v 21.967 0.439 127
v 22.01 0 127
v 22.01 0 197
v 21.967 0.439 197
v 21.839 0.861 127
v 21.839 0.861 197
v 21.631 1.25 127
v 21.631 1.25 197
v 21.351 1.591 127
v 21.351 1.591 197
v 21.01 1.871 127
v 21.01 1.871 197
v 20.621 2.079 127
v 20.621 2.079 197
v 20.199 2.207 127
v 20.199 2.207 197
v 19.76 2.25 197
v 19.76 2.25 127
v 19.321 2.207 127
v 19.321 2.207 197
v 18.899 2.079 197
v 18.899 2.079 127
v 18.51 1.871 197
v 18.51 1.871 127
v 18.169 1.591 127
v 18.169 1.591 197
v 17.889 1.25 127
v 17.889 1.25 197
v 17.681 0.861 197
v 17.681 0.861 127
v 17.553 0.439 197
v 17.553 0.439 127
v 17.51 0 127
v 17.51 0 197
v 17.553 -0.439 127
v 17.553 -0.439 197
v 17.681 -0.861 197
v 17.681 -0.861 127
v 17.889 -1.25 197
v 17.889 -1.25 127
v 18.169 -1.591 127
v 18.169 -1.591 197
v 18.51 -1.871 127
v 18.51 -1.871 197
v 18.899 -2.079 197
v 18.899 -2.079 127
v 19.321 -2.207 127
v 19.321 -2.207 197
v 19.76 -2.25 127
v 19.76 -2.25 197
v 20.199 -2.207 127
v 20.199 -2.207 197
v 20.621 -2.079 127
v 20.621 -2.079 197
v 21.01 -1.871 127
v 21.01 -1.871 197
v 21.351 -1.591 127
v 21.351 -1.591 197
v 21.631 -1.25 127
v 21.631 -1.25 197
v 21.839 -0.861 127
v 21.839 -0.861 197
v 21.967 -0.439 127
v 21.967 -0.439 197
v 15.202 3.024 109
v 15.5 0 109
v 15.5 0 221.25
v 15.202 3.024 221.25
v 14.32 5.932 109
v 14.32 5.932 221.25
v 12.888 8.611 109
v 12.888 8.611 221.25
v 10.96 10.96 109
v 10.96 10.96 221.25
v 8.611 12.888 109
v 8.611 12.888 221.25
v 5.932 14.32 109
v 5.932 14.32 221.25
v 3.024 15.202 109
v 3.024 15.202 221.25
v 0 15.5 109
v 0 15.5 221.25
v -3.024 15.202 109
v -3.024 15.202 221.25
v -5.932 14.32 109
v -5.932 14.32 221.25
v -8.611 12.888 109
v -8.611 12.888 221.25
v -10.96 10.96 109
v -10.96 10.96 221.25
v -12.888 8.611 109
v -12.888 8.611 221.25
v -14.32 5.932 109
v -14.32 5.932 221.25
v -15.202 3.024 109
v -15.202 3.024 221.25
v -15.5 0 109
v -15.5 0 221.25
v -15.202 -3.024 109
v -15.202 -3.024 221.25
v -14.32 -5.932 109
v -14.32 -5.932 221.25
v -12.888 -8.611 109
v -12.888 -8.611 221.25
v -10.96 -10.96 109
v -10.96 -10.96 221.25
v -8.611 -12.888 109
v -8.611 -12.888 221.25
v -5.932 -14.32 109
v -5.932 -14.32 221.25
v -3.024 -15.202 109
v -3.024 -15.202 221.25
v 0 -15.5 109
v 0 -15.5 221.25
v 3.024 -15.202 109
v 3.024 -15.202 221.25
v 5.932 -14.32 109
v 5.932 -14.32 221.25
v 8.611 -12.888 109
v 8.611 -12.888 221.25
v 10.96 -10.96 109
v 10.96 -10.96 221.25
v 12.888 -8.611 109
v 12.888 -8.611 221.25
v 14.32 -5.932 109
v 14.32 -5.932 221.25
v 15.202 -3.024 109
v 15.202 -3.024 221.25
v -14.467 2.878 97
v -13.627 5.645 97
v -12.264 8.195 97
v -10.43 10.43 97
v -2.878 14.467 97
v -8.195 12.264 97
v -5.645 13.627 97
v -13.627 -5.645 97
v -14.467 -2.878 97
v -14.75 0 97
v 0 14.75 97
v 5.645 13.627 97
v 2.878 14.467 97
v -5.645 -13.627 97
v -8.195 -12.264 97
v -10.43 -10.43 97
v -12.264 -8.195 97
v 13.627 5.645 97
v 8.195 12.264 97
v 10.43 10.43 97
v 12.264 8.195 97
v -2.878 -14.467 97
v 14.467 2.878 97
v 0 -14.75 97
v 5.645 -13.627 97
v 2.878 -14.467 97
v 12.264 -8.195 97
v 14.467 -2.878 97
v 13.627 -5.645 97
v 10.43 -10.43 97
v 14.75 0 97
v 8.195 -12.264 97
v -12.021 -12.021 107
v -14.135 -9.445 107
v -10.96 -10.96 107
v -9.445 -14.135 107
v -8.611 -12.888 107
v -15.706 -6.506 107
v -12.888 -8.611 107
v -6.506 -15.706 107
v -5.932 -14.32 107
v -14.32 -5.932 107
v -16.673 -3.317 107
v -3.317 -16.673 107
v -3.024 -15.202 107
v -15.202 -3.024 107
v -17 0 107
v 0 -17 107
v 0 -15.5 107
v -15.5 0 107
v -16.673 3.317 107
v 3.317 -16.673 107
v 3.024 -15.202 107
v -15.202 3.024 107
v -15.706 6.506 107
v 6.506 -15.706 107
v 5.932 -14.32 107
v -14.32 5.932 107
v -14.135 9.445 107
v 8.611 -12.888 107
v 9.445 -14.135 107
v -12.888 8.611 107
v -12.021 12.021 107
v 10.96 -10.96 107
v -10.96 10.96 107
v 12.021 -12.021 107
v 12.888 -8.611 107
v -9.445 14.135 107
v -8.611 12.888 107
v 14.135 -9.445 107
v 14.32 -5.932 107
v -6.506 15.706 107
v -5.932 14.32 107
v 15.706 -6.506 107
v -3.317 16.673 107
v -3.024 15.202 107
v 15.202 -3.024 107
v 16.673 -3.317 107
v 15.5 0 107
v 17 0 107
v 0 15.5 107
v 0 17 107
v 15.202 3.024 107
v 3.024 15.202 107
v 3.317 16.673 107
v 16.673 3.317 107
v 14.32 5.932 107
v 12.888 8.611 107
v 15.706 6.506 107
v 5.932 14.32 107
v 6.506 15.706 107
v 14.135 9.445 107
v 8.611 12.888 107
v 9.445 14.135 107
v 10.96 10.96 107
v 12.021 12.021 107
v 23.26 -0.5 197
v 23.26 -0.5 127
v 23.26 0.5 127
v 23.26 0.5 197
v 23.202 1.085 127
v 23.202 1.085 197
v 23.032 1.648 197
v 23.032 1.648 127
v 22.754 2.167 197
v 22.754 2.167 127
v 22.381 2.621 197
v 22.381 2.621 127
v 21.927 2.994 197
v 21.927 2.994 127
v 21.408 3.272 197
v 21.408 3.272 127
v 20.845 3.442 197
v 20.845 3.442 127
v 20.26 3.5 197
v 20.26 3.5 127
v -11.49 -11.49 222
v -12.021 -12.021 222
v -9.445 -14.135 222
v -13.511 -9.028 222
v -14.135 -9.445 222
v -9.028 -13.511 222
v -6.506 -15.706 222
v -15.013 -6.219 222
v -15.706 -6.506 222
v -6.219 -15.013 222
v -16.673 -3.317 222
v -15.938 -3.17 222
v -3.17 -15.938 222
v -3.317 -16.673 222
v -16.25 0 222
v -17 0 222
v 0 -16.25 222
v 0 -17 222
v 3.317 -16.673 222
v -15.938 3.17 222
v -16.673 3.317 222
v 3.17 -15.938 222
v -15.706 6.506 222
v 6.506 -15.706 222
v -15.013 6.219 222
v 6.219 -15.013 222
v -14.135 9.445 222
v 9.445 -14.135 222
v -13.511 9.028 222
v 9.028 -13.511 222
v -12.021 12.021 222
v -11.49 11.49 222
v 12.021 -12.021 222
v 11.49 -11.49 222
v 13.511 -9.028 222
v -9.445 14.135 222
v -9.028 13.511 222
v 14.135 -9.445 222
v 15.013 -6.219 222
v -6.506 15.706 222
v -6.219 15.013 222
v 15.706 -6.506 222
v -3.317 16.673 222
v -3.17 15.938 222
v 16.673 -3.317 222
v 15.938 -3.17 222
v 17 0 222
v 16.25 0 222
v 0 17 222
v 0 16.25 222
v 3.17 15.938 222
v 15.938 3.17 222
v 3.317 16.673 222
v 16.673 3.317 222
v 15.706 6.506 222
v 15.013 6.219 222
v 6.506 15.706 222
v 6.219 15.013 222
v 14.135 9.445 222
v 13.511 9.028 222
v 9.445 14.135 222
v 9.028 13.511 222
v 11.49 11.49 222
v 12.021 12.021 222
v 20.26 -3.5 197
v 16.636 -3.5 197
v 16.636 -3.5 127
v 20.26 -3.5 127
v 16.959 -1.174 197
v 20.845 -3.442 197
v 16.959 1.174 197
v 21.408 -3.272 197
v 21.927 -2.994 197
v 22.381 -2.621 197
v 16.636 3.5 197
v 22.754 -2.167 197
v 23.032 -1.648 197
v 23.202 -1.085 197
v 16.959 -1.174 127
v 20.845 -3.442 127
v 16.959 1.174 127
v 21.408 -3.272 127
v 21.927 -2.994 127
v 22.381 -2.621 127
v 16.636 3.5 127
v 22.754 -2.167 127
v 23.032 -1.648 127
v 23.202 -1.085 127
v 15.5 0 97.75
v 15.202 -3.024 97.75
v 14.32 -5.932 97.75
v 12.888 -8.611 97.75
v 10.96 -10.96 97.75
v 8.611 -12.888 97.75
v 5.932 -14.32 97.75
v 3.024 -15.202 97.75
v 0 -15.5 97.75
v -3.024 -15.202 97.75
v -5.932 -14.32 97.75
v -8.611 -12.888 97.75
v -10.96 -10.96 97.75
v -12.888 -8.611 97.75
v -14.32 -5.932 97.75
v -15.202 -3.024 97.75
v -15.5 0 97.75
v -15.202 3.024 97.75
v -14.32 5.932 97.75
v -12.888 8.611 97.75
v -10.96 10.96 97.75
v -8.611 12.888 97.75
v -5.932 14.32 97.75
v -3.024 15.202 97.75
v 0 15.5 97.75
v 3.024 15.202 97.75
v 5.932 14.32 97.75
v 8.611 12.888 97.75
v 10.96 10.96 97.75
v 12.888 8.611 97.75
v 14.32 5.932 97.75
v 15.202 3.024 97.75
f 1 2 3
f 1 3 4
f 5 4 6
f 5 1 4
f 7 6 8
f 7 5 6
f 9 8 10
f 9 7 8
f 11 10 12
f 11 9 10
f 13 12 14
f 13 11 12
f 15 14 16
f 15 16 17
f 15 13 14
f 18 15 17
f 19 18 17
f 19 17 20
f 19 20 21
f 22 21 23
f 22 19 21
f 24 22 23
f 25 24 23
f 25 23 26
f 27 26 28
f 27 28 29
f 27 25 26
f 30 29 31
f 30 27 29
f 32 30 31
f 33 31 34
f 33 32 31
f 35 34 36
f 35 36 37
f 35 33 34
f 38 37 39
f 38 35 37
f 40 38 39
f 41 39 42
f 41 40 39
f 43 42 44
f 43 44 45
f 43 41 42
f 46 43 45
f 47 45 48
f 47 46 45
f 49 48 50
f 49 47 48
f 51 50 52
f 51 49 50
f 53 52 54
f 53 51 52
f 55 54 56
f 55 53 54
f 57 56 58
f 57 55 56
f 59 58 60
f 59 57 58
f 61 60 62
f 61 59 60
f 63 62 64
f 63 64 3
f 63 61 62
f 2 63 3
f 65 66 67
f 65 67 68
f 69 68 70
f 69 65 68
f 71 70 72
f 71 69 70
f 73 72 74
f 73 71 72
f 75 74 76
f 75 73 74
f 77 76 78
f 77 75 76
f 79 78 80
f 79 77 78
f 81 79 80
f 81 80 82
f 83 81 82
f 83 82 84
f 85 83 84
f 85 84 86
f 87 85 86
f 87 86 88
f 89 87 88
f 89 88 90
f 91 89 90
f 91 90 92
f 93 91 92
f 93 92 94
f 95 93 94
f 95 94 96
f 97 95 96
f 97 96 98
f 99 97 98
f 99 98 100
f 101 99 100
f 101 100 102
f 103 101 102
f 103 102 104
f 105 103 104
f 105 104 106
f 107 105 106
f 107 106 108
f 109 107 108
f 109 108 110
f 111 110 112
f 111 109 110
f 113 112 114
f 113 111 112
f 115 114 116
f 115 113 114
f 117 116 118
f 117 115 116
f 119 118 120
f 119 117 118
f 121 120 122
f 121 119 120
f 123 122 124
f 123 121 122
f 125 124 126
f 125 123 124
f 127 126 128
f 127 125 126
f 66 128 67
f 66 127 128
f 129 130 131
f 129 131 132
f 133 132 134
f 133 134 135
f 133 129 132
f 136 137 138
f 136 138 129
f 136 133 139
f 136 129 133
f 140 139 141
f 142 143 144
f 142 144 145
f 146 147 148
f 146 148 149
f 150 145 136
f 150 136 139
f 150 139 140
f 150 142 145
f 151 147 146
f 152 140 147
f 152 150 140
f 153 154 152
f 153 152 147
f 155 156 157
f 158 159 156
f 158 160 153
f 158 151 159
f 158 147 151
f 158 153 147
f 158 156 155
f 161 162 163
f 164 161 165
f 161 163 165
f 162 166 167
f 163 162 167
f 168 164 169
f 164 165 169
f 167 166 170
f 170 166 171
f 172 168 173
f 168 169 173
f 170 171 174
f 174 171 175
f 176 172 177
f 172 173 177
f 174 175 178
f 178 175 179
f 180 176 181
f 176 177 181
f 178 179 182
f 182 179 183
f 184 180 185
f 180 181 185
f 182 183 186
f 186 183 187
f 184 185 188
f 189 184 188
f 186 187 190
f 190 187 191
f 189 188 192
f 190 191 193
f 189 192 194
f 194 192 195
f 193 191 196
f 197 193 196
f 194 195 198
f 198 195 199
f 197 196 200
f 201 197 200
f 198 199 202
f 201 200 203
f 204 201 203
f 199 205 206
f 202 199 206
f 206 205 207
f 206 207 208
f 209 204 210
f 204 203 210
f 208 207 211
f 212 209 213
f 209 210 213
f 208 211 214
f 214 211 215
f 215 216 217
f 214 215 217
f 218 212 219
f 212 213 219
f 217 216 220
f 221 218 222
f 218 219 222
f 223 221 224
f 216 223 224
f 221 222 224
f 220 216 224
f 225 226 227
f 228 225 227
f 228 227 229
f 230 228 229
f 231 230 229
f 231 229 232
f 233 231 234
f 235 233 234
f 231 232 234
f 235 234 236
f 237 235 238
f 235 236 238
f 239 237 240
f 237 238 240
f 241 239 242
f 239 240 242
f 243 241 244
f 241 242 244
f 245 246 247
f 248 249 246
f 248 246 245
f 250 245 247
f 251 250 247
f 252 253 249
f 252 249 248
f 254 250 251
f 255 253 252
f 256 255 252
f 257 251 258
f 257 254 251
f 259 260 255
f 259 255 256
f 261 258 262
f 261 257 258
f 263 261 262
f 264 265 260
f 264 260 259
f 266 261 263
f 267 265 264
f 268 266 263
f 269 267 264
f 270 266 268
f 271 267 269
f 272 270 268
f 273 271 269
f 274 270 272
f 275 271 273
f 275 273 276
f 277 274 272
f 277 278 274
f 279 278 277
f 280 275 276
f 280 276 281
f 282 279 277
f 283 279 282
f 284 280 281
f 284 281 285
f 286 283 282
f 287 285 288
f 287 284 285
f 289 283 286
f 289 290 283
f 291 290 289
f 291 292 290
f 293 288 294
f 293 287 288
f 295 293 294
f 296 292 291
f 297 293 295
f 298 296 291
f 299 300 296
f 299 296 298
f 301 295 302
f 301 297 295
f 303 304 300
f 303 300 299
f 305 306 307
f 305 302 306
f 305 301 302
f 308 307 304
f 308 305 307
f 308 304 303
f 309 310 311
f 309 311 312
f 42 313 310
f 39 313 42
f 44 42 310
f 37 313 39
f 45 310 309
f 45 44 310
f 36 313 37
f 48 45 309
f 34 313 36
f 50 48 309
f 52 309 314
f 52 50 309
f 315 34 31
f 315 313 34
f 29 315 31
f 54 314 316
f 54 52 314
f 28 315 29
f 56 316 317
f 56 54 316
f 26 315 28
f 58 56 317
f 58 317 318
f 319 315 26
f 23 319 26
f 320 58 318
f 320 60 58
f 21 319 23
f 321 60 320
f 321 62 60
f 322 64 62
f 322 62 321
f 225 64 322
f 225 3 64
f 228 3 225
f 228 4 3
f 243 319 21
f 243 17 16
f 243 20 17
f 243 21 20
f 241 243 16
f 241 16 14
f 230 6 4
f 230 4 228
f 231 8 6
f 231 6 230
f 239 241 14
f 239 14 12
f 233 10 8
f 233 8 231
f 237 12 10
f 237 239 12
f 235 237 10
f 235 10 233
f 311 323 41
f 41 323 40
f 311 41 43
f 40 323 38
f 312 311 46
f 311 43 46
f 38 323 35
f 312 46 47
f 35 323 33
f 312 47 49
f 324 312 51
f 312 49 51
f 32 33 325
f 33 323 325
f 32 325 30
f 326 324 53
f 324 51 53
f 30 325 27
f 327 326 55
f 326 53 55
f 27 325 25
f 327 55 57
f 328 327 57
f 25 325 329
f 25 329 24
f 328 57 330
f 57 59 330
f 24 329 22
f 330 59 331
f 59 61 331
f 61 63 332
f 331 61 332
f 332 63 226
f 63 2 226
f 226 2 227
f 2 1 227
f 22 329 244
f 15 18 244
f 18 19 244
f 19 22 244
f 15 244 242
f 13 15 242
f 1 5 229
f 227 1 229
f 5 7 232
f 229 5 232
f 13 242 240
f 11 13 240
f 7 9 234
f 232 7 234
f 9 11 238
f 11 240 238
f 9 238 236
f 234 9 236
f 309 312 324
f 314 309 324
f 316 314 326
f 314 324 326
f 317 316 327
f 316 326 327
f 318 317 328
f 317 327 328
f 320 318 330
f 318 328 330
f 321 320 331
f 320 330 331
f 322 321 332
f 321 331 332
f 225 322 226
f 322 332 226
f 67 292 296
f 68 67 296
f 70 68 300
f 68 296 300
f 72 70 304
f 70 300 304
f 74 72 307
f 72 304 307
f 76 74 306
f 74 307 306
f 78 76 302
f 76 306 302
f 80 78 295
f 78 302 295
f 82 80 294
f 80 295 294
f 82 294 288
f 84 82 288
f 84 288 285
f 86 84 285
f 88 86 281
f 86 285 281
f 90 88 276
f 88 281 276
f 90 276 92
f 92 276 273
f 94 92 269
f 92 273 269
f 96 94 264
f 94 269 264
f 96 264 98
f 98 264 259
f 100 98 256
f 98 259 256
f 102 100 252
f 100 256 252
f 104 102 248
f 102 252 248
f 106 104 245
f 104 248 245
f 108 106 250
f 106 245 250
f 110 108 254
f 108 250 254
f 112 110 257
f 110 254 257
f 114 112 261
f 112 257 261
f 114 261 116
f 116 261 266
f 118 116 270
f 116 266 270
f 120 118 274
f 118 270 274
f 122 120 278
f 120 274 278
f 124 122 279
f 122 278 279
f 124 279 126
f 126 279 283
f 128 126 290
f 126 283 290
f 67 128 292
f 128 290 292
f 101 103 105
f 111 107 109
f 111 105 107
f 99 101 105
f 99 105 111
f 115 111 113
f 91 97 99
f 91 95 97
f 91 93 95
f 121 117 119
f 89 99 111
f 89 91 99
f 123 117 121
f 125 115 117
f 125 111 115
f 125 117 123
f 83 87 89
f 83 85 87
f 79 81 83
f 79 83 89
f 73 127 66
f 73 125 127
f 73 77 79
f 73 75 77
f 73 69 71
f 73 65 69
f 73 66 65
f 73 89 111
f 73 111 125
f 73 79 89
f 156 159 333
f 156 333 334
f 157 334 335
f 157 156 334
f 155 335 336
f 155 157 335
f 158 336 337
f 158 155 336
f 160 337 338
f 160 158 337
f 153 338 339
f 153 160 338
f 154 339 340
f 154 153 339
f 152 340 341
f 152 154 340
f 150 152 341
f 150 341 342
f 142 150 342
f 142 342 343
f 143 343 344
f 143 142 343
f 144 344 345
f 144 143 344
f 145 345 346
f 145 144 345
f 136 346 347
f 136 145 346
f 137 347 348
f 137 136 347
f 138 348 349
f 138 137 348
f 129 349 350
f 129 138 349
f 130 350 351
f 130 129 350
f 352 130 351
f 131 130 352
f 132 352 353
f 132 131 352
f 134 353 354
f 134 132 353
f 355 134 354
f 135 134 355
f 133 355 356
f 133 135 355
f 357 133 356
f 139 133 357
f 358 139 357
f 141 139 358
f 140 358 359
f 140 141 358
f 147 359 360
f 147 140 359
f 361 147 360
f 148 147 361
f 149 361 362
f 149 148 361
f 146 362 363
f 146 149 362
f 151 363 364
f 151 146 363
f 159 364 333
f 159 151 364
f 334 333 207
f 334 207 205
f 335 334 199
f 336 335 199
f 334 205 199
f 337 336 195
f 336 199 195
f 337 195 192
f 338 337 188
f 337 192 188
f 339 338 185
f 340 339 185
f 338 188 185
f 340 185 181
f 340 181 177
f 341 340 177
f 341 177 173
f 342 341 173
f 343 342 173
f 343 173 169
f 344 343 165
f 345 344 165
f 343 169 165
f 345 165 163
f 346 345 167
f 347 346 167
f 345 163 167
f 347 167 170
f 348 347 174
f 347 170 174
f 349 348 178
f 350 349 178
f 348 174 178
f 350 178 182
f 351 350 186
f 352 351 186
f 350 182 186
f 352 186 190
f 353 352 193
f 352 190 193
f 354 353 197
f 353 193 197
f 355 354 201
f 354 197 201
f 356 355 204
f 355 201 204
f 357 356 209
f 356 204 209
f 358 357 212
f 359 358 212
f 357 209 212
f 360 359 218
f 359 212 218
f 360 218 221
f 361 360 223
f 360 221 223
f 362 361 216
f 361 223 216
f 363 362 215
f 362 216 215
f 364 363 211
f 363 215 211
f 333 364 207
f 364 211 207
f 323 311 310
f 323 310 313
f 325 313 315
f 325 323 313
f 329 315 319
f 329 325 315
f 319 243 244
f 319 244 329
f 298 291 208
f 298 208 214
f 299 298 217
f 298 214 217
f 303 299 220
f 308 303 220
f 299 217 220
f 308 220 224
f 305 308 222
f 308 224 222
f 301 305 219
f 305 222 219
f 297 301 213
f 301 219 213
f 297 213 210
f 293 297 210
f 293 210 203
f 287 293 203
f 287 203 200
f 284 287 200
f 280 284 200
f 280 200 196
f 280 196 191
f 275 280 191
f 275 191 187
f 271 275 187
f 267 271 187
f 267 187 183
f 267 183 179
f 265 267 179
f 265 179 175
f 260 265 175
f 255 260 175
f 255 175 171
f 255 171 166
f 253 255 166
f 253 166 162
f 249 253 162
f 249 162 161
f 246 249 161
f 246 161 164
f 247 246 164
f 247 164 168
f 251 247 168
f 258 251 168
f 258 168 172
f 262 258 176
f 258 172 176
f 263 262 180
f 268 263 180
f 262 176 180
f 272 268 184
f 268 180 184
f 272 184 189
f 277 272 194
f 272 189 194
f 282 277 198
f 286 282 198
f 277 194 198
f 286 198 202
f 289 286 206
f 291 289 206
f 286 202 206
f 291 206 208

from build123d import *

# Parameters (mm, degrees)
F1_R      = 17
F1_R_2    = 15.5
F2_DEPTH  = 115
F3_SIZE   = 0.75
F4_R      = 17
F5_DEPTH  = 2
F6_R      = 15.5
F7_DEPTH  = 10
F8_SIZE   = 0.75
F10_R     = 2.25
F11_DEPTH = 70


with BuildPart() as f2:
    # F1 (on offset) → F2 (new body)
    with BuildSketch(Plane.XY.offset(107)):
        Circle(F1_R)
        Circle(F1_R_2, mode=Mode.SUBTRACT)
    extrude(amount=F2_DEPTH)

    # F3
    f3_edges = [f2.edges().sort_by_distance(p)[0] for p in [
        (-15.5, 0, 222),
    ]]
    chamfer(f3_edges, length=F3_SIZE)

    # F4 (on offset) → F5 (join)
    with BuildSketch(Plane.XY.offset(107)):
        Circle(F4_R)
    extrude(amount=F5_DEPTH)

    # F6 (on face) → F7 (join)
    with BuildSketch(Plane(origin=(0, 0, 107), x_dir=(1, 0, 0), z_dir=(0, 0, -1))):
        Circle(F6_R)
    extrude(amount=F7_DEPTH)

    # F8
    f8_edges = [f2.edges().sort_by_distance(p)[0] for p in [
        (-15.5, 0, 97),
    ]]
    chamfer(f8_edges, length=F8_SIZE)


with BuildPart() as f11:
    # F10 (on offset) → F11 (new body)
    with BuildSketch(Plane.XY.offset(127)):
        with BuildLine():
            Line((20.260046, 3.5), (16.260046, 3.5))
            Line((16.260046, 3.5), (16.260046, -3.5))
            Line((16.260046, -3.5), (20.260046, -3.5))
            ThreePointArc((20.260046, -3.5), (22.381366, -2.62132), (23.260046, -0.5))
            Line((23.260046, -0.5), (23.260046, 0.5))
            ThreePointArc((23.260046, 0.5), (22.381366, 2.62132), (20.260046, 3.5))
        make_face()
        with Locations((19.760046, 0)):
            Circle(F10_R, mode=Mode.SUBTRACT)
    extrude(amount=F11_DEPTH)

    # F12: cut F2
    add(f2.part, mode=Mode.SUBTRACT)


solid = Compound([f2.part, f11.part])
